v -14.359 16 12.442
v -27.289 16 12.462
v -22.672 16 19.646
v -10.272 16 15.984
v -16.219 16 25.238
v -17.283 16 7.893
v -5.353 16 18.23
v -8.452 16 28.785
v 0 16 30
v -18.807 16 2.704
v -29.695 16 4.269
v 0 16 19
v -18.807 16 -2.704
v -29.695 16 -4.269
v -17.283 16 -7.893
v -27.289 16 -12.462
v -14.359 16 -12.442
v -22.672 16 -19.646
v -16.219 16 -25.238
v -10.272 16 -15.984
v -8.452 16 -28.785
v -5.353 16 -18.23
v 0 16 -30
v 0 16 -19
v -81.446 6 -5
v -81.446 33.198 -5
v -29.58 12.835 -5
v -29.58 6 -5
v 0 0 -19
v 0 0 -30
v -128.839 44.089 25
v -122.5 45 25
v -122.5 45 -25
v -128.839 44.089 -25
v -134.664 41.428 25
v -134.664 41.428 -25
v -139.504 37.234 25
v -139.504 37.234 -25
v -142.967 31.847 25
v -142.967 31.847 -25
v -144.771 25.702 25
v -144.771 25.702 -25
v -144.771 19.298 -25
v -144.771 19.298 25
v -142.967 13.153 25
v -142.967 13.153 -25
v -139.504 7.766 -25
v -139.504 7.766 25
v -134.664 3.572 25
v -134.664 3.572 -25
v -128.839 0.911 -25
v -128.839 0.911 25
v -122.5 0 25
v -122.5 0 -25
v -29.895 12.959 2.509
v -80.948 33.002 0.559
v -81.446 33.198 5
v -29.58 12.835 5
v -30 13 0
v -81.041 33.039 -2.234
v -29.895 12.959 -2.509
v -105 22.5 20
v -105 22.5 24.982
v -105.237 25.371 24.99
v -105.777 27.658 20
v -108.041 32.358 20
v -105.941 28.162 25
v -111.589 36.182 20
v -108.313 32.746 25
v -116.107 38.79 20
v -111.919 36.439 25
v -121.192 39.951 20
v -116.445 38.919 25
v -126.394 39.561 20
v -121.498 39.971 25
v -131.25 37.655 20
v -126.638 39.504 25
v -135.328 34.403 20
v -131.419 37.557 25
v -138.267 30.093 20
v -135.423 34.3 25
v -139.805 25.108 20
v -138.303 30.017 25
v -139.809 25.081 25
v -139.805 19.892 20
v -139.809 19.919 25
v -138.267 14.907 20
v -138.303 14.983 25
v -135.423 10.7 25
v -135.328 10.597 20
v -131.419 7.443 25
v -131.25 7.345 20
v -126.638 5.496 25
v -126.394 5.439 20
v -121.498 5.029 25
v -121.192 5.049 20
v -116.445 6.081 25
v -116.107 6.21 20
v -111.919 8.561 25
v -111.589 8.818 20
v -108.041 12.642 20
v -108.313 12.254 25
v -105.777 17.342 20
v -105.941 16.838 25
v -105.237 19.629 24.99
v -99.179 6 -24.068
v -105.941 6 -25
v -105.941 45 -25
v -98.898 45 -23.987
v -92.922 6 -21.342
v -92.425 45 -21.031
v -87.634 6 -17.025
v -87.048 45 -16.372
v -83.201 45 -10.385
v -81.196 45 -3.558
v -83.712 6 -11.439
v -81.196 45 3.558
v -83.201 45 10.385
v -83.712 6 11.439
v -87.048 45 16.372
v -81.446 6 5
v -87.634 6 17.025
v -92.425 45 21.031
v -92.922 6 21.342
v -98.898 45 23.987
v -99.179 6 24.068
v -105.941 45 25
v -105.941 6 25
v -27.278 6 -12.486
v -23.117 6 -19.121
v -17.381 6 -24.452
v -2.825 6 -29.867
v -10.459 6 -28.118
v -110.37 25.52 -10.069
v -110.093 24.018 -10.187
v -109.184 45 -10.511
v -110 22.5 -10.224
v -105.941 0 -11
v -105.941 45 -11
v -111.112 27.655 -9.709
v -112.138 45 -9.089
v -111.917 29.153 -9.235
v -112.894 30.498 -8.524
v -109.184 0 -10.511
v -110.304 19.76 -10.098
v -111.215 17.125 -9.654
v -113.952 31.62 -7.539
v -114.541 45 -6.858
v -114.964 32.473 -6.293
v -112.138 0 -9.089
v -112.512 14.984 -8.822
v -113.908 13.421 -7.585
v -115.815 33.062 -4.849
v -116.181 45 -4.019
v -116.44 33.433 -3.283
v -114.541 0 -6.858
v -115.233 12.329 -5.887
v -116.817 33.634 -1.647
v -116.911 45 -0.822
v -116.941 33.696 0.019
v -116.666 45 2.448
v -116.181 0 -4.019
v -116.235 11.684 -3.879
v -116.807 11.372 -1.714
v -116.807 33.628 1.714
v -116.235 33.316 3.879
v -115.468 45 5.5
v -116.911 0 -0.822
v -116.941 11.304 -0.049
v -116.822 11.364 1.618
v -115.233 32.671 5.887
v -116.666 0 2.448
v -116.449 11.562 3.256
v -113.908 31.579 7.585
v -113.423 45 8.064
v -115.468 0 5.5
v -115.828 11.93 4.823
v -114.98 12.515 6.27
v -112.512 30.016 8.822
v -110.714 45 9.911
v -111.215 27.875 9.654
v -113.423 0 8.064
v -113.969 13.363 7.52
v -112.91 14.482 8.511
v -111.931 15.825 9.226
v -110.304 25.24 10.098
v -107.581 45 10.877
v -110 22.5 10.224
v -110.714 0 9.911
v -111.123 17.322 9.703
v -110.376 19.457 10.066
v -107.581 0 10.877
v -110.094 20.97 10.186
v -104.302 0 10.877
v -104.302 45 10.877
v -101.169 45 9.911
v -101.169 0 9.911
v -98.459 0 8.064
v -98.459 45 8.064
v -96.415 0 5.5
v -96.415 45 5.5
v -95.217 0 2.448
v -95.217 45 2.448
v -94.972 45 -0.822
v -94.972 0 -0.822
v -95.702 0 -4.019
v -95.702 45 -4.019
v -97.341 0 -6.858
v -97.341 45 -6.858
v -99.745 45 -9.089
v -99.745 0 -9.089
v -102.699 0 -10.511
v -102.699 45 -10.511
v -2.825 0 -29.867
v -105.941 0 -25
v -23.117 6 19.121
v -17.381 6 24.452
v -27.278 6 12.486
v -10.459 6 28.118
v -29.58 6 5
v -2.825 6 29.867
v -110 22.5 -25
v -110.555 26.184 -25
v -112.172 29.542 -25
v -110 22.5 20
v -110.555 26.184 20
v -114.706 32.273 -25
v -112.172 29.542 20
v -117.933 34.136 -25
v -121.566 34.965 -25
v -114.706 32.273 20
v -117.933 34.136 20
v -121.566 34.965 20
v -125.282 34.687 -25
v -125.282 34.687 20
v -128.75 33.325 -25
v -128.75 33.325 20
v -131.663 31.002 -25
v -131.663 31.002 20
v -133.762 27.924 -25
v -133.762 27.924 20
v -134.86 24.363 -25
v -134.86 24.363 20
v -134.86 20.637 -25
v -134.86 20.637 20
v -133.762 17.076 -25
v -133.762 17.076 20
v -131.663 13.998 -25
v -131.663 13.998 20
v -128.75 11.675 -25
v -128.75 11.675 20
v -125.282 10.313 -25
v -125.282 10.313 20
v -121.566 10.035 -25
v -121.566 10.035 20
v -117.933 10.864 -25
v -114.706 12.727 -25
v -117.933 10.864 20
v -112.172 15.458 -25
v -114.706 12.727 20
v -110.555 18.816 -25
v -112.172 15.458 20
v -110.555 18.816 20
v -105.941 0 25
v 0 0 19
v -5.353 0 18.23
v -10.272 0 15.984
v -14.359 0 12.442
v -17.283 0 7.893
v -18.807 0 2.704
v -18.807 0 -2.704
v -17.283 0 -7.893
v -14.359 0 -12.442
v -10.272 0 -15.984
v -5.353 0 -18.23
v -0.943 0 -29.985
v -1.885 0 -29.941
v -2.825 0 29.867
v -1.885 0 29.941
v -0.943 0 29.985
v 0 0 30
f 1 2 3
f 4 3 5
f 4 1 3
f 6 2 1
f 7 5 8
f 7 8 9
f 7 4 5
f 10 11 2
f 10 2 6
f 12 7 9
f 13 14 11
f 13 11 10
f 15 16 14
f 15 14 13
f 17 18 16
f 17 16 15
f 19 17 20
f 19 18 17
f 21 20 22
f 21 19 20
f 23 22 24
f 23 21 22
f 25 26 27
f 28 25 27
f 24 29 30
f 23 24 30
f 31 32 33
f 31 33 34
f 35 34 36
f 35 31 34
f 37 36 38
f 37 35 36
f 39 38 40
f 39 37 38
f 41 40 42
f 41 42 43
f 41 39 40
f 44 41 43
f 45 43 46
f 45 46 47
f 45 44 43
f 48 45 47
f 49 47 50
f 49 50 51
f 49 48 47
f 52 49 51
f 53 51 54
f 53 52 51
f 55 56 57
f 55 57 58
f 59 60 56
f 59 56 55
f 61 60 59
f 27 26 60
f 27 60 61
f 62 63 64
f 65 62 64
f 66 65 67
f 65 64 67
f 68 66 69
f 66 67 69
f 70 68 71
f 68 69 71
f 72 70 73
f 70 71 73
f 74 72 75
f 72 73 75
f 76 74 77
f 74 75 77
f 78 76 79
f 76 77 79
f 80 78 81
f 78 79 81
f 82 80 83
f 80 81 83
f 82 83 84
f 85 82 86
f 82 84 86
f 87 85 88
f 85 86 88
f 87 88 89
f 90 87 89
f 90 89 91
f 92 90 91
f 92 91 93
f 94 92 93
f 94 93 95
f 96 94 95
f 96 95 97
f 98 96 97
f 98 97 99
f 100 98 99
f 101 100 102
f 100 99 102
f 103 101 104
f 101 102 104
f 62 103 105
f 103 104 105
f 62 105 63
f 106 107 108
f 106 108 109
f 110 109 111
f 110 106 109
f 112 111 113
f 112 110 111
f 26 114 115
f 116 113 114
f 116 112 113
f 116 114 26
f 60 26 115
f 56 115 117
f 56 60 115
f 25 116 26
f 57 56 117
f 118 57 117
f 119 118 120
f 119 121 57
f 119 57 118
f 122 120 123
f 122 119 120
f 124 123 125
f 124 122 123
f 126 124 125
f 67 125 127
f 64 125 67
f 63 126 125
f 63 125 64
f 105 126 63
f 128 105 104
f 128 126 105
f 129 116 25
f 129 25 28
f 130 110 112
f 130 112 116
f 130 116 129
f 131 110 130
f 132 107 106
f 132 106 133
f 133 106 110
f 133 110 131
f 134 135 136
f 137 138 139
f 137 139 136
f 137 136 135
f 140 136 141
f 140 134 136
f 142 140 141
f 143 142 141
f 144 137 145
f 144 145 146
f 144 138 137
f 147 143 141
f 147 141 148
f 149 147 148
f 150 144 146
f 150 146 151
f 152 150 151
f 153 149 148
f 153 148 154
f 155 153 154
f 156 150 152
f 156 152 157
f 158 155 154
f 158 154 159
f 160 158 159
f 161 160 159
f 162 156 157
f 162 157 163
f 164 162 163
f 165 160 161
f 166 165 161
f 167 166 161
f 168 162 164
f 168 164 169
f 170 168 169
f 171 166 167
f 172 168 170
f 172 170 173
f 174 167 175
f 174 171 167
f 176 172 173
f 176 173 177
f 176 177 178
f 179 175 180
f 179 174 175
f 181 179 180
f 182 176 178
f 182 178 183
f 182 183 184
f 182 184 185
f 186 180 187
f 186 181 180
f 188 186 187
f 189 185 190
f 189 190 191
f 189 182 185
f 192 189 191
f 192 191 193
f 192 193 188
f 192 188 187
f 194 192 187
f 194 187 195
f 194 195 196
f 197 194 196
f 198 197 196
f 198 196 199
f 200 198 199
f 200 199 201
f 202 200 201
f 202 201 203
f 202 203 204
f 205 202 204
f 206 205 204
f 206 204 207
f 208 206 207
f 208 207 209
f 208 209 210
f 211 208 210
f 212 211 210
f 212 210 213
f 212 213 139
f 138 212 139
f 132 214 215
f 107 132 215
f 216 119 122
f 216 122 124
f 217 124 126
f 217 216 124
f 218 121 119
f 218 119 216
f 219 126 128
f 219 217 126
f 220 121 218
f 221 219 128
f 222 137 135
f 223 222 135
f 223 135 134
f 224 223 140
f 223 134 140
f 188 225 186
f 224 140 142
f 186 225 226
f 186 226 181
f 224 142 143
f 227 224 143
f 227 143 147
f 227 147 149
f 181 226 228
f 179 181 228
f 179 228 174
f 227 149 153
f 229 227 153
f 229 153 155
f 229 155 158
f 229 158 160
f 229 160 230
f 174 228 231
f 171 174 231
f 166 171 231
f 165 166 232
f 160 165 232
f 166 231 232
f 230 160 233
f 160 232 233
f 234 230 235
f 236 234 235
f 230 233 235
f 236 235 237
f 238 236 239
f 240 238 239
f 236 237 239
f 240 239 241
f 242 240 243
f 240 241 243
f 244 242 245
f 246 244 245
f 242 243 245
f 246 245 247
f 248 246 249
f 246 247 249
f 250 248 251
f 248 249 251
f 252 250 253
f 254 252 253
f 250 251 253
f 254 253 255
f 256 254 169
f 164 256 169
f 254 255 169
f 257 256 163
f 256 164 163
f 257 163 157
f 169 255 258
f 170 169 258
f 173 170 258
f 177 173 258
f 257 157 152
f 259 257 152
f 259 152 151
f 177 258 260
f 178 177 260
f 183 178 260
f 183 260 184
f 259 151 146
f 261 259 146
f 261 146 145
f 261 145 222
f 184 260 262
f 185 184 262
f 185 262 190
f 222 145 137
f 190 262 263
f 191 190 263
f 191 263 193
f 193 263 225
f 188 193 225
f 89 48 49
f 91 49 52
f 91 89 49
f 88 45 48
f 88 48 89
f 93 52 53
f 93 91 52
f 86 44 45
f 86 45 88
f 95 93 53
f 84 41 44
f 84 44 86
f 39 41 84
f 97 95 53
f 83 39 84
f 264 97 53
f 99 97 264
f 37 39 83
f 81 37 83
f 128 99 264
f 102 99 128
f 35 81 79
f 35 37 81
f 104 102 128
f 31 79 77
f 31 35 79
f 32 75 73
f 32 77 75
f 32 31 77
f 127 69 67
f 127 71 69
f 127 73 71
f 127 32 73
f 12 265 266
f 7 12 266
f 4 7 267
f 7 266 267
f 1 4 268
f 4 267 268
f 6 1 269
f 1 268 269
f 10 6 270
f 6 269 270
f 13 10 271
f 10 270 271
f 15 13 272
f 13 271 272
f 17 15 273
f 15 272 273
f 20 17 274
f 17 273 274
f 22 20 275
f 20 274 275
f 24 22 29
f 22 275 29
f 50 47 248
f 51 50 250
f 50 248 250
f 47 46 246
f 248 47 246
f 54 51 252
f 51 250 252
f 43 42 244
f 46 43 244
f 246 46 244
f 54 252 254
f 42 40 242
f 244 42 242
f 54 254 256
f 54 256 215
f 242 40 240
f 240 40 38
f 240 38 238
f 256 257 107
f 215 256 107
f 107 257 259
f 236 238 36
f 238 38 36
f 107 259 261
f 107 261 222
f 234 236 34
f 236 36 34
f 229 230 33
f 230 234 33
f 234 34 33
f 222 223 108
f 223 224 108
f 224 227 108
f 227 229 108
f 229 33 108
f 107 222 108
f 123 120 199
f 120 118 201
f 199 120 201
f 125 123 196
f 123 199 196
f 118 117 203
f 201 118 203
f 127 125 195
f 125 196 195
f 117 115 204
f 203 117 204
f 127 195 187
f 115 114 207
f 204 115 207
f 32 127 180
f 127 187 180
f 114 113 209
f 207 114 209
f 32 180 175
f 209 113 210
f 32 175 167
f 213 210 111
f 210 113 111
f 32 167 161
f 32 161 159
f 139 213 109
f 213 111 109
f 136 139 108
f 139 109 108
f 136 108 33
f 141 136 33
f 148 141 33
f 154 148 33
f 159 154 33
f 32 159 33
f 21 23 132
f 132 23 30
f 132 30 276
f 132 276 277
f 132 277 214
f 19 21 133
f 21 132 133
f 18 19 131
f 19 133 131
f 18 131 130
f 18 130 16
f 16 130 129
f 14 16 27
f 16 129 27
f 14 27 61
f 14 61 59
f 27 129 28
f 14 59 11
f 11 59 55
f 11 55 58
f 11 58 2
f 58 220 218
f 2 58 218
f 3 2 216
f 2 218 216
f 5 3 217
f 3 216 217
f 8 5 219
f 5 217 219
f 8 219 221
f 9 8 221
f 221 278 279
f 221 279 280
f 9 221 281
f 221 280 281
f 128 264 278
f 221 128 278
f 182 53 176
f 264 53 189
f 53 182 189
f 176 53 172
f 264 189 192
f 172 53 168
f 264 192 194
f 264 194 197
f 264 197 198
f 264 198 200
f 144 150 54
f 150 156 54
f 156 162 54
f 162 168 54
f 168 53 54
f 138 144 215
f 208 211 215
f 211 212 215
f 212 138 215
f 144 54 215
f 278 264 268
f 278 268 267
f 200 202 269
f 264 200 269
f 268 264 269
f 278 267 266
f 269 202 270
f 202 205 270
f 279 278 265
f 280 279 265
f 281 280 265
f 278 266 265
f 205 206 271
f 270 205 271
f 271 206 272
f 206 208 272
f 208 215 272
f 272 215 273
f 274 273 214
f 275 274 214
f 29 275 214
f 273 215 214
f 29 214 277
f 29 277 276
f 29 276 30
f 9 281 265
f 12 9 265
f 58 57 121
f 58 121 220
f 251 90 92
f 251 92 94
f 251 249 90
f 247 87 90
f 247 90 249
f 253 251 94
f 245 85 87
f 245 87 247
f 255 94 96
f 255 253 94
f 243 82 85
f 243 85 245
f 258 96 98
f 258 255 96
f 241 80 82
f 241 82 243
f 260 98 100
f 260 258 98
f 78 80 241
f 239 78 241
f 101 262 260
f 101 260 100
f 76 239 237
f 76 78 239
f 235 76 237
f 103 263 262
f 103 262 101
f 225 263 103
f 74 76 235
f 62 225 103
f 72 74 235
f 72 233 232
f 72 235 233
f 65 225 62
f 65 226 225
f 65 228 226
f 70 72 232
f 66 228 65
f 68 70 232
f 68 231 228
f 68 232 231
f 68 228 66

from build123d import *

# Parameters (mm, degrees)
BOSS_EXTRUDE1_DEPTH = 16
SKETCH4_R           = 11
BOSS_EXTRUDE5_DEPTH = 45
SKETCH8_R           = 12.5
BOSS_EXTRUDE8_DEPTH = 50
SKETCH11_R          = 12.5
CUT_EXTRUDE1_DEPTH  = 50
SKETCH12_R          = 17.5
CUT_EXTRUDE2_DEPTH  = 5
BOSS_EXTRUDE9_DEPTH = 6
RIB4_REACH          = 156.758
SKETCH16_WALL_W     = 366.24251427
SKETCH16_WALL_H     = 10


with BuildPart() as part:
    # Sketch2 → Boss-Extrude1 (new body)
    with BuildSketch(Plane(origin=(0, 0, 0), x_dir=(1, 0, 0), z_dir=(0, 1, 0))):
        with BuildLine():
            Line((0, 19), (0, 30))
            ThreePointArc((0, 30), (-30, 0), (0, -30))
            Line((0, -30), (0, -19))
            ThreePointArc((0, -19), (-19, 0), (0, 19))
        make_face()
    extrude(amount=BOSS_EXTRUDE1_DEPTH)



with BuildPart() as body_2:
    # Sketch4 → Boss-Extrude5 (new body)
    with BuildSketch(Plane(origin=(0, 0, 0), x_dir=(1, 0, 0), z_dir=(0, 1, 0))):
        with BuildLine():
            Line((-122.5, 25), (-105.941325388, 25))
            ThreePointArc((-105.941325388, 25), (-80.941325388, 0), (-105.941325388, -25))
            Line((-105.941325388, -25), (-122.5, -25))
            Line((-122.5, -25), (-122.5, 25))
        make_face()
        with Locations(Location((-105.941325388, 0, 0), (0, 0, 90))):
            Circle(SKETCH4_R, mode=Mode.SUBTRACT)
    extrude(amount=BOSS_EXTRUDE5_DEPTH)

    # Sketch8 → Boss-Extrude8 (add)
    with BuildSketch(Plane.XY.offset(25)):
        with Locations((-122.5, 22.5)):
            Circle(SKETCH8_R)
        with BuildLine():
            ThreePointArc((-122.5, 45), (-145, 22.5), (-122.5, 0))
            Line((-122.5, 0), (-122.5, 45))
        make_face()
        with BuildLine():
            ThreePointArc((-122.5, 35), (-135, 22.5), (-122.5, 10))
            Line((-122.5, 10), (-122.5, 35))
        make_face()
        with BuildLine():
            Line((-122.5, 35), (-122.5, 10))
            ThreePointArc((-122.5, 10), (-113.661165235, 13.661165235), (-110, 22.5))
            ThreePointArc((-110, 22.5), (-113.661165235, 31.338834765), (-122.5, 35))
        make_face()
    extrude(amount=-BOSS_EXTRUDE8_DEPTH)

    # Sketch11 → Cut-Extrude1 (cut)
    with BuildSketch(Plane.XY.offset(25)):
        with Locations((-122.5, 22.5)):
            Circle(SKETCH11_R)
    extrude(amount=-CUT_EXTRUDE1_DEPTH, mode=Mode.SUBTRACT)

    # Sketch12 → Cut-Extrude2 (cut)
    with BuildSketch(Plane.XY.offset(25)):
        with Locations((-122.5, 22.5)):
            Circle(SKETCH12_R)
    extrude(amount=-CUT_EXTRUDE2_DEPTH, mode=Mode.SUBTRACT)


with BuildPart() as part_1:
    add(part.part)

    add(body_2.part)  # Boss-Extrude9 merges body 2
    # Sketch13 → Boss-Extrude9 (add)
    with BuildSketch(Plane(origin=(0, 0, 0), x_dir=(1, 0, 0), z_dir=(0, 1, 0))):
        with BuildLine():
            ThreePointArc((-105.941325388, 25), (-80.941325388, 0), (-105.941325388, -25))
            Line((-105.941325388, -25), (-2.825462558, -29.86664965))
            ThreePointArc((-2.825462558, -29.86664965), (-30, 0), (-2.825462558, 29.86664965))
            Line((-2.825462558, 29.86664965), (-105.941325388, 25))
        make_face()
    extrude(amount=BOSS_EXTRUDE9_DEPTH)

    # Sketch16 wall → Rib4 (add, up to next)
    with BuildSketch(Plane(origin=(-55.470662694, 23, 0), x_dir=(0.930830223145, -0.365451906112, 0), z_dir=(0.365451906112, 0.930830223145, 0)), mode=Mode.PRIVATE) as rib4_sk1:
        Rectangle(SKETCH16_WALL_W, SKETCH16_WALL_H)
    rib4_tool1 = extrude(rib4_sk1.sketch, amount=-RIB4_REACH, mode=Mode.PRIVATE) - part_1.part
    add(rib4_tool1.solids().sort_by_distance((-55.470662694, 23, 0))[0])


solid = part_1.part
